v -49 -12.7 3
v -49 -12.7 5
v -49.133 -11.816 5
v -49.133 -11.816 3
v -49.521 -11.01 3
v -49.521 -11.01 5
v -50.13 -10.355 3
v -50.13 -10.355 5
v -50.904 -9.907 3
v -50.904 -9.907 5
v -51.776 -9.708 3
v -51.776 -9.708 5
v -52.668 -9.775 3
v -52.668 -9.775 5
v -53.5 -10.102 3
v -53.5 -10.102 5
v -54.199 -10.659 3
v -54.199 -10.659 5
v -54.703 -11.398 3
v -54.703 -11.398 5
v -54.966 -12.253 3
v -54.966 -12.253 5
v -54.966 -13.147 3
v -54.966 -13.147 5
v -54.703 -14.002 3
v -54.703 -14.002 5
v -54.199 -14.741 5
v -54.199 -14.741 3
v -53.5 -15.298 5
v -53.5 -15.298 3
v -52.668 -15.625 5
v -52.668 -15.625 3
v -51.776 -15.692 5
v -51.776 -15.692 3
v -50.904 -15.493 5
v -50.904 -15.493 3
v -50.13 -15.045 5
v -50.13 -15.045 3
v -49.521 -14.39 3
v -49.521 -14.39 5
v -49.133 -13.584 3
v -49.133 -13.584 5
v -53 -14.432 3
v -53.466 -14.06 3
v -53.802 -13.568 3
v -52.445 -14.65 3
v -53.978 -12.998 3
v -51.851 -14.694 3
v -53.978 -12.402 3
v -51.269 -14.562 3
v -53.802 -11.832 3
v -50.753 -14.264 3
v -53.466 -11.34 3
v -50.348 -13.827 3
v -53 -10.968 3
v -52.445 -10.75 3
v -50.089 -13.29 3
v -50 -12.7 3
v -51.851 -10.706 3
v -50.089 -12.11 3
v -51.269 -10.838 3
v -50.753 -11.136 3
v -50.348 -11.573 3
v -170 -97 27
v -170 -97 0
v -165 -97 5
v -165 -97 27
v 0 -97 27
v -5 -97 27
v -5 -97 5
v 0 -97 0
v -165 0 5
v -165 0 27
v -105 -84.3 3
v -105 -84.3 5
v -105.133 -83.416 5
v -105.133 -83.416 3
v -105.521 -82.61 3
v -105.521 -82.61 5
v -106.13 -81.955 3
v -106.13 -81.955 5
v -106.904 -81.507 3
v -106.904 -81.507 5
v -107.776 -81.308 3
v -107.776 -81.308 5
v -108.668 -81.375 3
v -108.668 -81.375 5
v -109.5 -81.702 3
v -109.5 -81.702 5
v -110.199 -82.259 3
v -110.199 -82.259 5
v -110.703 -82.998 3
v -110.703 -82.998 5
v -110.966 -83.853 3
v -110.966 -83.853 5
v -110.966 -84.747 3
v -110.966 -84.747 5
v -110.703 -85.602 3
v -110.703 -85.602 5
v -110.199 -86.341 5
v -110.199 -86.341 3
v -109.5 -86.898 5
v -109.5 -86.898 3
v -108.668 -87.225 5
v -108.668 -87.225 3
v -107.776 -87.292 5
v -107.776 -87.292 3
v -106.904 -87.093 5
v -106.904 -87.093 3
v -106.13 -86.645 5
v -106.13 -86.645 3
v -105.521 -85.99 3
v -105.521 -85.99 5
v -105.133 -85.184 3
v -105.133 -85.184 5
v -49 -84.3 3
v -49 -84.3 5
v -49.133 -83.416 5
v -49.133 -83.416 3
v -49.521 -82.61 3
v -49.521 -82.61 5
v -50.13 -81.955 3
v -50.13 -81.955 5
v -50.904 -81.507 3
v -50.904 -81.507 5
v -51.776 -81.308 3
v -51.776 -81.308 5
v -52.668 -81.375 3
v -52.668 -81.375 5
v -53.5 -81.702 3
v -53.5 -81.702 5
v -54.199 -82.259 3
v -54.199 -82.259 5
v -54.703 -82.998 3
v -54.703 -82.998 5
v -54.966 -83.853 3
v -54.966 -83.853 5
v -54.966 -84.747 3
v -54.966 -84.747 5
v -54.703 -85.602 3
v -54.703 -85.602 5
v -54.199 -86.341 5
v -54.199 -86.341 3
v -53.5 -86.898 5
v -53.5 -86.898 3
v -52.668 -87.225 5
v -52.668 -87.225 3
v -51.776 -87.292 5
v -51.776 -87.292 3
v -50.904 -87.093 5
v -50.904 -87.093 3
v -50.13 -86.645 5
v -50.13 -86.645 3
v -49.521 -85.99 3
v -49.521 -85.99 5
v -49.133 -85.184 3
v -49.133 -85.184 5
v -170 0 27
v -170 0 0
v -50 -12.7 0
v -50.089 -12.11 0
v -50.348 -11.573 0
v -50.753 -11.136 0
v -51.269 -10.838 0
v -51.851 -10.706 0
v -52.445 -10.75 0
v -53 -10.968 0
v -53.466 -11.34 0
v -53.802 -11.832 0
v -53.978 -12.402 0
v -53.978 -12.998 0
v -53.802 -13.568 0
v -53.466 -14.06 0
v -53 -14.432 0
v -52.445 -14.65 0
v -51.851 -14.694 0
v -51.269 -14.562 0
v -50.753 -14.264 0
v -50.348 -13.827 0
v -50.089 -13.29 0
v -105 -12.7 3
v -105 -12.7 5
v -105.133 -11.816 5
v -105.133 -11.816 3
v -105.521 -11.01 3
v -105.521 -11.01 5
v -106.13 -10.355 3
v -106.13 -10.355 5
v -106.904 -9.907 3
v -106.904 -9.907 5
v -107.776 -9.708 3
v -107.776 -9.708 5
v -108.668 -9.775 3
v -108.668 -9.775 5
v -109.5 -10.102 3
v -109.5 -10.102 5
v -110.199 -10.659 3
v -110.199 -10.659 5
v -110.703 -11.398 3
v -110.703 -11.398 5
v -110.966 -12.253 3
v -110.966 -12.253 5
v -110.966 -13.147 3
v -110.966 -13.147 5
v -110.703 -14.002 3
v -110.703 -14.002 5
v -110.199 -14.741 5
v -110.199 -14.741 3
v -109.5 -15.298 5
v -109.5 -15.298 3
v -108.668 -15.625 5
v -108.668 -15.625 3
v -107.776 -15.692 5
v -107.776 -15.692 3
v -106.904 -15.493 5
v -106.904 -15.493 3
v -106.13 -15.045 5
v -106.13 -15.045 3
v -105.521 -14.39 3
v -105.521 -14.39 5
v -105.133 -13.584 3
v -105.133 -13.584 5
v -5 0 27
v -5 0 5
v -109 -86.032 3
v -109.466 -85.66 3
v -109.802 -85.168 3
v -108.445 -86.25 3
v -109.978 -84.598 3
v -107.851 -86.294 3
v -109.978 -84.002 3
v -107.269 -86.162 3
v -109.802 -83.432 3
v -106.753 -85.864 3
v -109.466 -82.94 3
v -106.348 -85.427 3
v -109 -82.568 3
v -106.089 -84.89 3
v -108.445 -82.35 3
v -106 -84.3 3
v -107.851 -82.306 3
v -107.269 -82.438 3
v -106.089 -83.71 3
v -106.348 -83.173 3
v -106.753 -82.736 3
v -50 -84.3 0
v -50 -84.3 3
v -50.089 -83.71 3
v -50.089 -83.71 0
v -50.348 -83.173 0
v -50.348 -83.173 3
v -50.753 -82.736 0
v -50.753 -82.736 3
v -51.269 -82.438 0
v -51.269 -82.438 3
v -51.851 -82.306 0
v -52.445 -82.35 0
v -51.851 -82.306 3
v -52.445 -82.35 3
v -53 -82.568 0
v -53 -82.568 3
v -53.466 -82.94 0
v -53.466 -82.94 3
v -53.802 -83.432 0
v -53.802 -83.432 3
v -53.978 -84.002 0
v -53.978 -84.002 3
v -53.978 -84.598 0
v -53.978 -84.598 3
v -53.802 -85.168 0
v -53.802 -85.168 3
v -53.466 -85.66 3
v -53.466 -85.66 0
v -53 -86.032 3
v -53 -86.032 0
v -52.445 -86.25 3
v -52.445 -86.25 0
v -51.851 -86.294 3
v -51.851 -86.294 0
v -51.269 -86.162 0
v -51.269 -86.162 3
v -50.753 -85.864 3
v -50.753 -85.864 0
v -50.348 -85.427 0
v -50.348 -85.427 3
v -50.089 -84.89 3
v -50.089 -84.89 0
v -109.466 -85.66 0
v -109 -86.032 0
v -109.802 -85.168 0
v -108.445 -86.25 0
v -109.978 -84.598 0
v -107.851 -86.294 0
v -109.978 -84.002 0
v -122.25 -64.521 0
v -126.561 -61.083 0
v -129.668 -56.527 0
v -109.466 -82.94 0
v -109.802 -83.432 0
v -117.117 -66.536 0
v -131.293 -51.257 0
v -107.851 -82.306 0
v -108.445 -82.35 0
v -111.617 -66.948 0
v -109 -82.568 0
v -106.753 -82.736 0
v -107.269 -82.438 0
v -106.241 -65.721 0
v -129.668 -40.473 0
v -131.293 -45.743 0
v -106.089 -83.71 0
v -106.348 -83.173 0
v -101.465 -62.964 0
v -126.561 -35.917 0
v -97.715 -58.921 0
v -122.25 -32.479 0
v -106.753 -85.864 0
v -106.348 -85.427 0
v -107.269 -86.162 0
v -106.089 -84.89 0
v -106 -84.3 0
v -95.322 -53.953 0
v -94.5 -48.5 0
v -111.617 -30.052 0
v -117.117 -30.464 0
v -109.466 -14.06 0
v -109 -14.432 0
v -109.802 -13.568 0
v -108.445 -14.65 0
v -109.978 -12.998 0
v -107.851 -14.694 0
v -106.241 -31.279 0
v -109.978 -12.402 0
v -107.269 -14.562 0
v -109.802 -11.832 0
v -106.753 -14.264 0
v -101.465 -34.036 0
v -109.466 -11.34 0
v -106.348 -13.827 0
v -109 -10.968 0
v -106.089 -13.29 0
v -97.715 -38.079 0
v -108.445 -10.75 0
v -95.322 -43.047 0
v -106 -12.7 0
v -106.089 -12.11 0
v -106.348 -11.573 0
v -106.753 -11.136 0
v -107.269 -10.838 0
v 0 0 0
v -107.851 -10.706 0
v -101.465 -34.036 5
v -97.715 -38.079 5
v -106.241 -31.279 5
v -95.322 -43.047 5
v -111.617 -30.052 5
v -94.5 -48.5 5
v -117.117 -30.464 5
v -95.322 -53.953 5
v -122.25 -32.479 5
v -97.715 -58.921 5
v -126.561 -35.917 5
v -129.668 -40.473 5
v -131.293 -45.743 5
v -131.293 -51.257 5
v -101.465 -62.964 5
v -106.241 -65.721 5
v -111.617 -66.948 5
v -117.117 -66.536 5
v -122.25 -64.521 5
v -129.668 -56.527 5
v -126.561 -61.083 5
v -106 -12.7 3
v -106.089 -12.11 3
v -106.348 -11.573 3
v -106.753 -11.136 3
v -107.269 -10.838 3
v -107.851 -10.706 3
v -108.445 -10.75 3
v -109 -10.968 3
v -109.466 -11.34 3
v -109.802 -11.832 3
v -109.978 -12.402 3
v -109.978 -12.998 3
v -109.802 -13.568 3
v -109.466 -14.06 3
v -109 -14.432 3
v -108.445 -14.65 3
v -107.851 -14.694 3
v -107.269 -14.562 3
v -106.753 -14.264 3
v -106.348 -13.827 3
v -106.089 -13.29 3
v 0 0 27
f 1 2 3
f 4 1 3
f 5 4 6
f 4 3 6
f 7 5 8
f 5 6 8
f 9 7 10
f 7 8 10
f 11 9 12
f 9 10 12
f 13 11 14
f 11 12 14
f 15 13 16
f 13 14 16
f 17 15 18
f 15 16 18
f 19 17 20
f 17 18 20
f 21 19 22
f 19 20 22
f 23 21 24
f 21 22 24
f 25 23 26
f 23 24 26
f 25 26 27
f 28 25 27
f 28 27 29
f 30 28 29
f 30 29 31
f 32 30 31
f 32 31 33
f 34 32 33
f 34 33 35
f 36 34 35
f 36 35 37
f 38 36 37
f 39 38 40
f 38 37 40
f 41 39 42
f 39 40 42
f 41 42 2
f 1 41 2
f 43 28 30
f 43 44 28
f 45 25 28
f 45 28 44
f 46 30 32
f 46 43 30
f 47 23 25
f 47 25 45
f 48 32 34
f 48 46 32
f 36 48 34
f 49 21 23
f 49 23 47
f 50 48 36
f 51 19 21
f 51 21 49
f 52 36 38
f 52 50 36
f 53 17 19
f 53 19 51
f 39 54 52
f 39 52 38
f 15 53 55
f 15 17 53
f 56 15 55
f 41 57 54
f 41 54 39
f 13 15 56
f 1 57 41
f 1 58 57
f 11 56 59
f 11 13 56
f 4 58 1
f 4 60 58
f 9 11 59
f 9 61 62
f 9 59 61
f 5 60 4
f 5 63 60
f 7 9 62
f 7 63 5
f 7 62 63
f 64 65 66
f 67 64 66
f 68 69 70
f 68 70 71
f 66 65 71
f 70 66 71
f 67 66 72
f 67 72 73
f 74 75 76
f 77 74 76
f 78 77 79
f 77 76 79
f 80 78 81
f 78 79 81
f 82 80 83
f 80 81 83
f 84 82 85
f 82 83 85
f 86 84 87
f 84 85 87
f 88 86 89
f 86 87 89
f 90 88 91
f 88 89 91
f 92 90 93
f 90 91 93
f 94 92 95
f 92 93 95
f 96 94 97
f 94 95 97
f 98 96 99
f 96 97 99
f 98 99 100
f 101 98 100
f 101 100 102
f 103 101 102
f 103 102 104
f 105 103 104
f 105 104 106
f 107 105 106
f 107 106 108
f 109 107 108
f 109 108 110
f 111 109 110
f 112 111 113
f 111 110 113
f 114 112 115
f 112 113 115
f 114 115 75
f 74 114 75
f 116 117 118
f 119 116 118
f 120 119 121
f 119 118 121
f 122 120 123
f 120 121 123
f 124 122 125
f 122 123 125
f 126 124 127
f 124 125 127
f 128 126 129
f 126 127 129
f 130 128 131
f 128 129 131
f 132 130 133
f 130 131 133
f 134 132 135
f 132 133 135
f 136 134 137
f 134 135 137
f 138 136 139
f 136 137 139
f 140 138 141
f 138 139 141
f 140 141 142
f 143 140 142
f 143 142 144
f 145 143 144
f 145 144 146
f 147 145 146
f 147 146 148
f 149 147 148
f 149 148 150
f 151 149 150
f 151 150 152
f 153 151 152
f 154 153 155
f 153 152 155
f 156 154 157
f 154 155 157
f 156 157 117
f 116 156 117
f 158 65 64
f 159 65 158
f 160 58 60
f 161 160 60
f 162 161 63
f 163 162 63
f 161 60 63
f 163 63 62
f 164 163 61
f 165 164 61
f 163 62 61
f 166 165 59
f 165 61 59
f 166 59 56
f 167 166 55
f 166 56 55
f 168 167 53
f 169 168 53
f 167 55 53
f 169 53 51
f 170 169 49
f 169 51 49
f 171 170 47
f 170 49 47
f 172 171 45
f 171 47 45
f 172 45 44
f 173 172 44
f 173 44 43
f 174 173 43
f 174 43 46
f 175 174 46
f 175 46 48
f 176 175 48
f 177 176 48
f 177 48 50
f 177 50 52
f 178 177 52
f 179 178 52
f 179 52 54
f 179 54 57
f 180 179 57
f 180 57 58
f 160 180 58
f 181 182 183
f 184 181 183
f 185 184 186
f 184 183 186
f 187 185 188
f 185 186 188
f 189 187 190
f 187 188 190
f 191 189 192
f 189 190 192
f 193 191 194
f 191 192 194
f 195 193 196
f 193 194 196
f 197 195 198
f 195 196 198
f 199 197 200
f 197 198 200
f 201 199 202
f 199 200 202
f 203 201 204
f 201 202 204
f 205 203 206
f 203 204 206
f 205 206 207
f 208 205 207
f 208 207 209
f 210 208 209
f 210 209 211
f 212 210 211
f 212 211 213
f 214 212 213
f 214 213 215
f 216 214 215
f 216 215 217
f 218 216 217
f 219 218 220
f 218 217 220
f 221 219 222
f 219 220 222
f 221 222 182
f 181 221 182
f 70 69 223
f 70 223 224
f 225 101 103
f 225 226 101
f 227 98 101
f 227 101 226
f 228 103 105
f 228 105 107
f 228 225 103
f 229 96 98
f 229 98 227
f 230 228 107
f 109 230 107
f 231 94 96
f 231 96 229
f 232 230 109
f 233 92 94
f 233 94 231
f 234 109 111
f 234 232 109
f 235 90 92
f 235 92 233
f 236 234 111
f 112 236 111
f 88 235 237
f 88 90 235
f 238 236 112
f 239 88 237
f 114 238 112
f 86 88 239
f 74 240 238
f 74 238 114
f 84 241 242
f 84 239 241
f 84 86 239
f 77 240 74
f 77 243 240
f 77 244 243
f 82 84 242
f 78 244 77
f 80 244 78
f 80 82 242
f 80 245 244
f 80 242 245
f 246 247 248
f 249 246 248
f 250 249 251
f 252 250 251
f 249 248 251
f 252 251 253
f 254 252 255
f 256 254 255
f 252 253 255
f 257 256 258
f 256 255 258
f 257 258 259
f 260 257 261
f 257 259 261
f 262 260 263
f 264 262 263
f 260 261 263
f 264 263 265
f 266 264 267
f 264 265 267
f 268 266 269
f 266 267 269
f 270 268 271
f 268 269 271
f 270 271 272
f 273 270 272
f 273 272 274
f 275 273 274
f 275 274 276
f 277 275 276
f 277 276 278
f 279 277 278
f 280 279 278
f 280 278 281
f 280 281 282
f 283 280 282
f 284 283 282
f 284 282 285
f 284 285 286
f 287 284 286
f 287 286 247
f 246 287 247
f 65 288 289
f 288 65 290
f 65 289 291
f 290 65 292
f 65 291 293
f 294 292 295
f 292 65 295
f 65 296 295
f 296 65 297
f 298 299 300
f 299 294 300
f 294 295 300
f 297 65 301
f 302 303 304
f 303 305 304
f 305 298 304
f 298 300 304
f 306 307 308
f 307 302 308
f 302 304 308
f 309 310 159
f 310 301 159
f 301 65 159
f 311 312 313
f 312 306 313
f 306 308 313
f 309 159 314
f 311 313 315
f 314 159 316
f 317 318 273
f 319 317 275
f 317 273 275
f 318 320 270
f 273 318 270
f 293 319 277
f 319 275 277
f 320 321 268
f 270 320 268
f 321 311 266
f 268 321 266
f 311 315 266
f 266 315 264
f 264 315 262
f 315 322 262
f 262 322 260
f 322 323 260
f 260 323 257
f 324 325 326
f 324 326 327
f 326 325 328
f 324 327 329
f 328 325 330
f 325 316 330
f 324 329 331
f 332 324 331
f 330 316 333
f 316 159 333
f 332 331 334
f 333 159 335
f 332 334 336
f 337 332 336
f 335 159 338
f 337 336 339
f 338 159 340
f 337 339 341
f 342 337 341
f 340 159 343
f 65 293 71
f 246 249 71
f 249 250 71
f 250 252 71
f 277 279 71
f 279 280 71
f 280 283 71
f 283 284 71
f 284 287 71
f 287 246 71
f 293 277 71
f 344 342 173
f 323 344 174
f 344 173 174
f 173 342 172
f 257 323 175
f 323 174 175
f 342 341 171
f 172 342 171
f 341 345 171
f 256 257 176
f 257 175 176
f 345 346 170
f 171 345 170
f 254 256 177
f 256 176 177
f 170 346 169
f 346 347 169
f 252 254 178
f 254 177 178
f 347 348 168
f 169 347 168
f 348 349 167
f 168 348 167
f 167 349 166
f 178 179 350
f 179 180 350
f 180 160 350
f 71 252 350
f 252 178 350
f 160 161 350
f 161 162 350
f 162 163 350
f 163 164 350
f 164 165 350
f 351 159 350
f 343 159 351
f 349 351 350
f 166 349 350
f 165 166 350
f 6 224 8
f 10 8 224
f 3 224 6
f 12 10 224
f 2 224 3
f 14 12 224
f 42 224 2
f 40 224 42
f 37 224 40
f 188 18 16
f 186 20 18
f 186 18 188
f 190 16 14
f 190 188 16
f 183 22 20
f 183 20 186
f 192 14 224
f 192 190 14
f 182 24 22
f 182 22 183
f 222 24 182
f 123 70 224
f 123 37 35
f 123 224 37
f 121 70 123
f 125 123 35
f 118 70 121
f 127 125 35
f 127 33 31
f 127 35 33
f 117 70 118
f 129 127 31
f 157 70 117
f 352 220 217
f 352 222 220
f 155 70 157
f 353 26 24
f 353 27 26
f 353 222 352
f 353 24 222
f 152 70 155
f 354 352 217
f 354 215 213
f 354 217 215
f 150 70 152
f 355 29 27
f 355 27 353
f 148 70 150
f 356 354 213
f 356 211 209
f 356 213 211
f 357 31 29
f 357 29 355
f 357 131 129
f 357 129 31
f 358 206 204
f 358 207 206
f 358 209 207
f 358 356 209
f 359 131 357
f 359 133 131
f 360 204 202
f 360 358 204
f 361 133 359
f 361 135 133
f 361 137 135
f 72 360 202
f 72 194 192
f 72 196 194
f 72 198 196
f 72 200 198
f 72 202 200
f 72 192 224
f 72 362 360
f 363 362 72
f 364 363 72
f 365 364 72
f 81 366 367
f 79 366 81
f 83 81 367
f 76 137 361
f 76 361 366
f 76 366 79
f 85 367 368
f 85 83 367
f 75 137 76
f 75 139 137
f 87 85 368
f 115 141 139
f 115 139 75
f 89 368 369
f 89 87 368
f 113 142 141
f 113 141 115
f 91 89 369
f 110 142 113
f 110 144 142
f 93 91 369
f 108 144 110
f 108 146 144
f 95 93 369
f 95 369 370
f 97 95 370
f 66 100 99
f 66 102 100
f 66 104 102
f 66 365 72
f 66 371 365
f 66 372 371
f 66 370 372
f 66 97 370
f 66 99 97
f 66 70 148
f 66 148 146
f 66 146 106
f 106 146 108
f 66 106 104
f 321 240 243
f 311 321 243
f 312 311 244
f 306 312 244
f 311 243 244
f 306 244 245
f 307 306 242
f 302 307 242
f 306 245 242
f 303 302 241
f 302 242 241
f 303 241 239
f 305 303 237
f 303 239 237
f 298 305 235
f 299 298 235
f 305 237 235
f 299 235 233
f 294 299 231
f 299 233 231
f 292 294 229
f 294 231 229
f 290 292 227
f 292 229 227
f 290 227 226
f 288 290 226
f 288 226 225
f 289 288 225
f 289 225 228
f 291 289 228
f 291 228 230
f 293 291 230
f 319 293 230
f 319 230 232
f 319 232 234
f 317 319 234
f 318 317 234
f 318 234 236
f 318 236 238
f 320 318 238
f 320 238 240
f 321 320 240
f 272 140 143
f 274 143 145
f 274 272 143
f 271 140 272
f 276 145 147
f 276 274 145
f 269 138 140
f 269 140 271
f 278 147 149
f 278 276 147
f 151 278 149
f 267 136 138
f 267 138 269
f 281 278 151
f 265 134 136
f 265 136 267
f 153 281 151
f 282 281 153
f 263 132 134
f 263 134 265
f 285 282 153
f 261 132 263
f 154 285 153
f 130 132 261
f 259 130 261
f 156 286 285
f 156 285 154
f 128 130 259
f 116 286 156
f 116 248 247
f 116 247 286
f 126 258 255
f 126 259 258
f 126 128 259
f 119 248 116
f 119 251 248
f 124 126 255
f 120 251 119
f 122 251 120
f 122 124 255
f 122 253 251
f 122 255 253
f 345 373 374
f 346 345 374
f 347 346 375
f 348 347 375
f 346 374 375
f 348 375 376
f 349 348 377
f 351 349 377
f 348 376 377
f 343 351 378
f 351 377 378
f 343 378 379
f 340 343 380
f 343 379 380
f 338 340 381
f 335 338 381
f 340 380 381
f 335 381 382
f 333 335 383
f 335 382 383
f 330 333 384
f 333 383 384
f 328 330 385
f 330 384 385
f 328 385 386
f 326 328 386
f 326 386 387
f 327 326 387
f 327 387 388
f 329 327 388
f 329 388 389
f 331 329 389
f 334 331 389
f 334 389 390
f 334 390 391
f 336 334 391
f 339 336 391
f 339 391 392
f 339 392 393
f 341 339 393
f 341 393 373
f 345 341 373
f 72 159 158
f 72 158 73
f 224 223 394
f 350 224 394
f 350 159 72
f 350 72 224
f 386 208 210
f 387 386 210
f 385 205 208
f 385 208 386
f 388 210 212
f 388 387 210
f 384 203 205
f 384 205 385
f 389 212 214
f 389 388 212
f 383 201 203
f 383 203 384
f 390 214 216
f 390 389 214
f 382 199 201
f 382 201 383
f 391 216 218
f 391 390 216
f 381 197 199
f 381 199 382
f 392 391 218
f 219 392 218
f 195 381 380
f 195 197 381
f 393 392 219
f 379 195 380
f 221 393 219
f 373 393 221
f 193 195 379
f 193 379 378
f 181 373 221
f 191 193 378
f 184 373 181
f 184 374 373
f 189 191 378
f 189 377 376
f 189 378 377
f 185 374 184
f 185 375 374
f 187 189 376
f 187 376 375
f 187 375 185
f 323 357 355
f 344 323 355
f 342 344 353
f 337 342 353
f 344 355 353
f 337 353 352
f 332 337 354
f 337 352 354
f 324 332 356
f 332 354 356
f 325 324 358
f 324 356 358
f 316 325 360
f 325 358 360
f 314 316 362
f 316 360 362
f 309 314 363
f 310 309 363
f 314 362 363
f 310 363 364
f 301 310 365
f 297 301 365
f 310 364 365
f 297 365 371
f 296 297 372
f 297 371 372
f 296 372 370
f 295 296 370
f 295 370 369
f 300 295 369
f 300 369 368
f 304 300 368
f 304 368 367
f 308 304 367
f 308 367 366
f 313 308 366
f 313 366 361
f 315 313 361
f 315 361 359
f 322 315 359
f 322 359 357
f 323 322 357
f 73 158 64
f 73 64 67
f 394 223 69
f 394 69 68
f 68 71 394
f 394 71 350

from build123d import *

# Parameters (mm, degrees)
SKETCH_1_W               = 170
SKETCH_1_H               = 97
EXTRUDE_1_DEPTH          = 27
CUT_EXTRUDE_1_DEPTH      = 198.580363397
CUT_EXTRUDE_1_DEPTH_BACK = 198.580363397
SKETCH_4_W               = 2
SKETCH_4_H               = 2
CUT_EXTRUDE_2_DEPTH      = 198.580363397
SKETCH_5_R               = 18.5
SKETCH_5_R_2             = 2
CUT_EXTRUDE_3_DEPTH      = 197.959386677
SKETCH_6_R               = 3
CUT_EXTRUDE_4_DEPTH      = 2


with BuildPart() as part:
    # 草图1 → 凸台-拉伸1 (new body)
    with BuildSketch(Plane.XY):
        with Locations((-85, -48.5)):
            Rectangle(SKETCH_1_W, SKETCH_1_H)
    extrude(amount=EXTRUDE_1_DEPTH)

    # 草图2 → 切除-拉伸1 (cut, two sides: drawn at the far end of the back side and taken through both)
    with BuildSketch(Plane(origin=(0, 0, 0), x_dir=(1, 0, 0), z_dir=(0, 1, 0)).offset(-CUT_EXTRUDE_1_DEPTH_BACK)):
        Polygon((-5, -5), (-165, -5), (-165, -25), (-163, -25), (-163, -27), (-7, -27), (-7, -25), (-5, -25), align=None)
    extrude(amount=CUT_EXTRUDE_1_DEPTH + CUT_EXTRUDE_1_DEPTH_BACK, mode=Mode.SUBTRACT)

    # 草图4 → 切除-拉伸2 (cut, through all)
    with BuildSketch(Plane(origin=(0, 0, 0), x_dir=(1, 0, 0), z_dir=(0, 1, 0))):
        with Locations((-6, -26)):
            Rectangle(SKETCH_4_W, SKETCH_4_H)
        with Locations((-164, -26)):
            Rectangle(SKETCH_4_W, SKETCH_4_H)
    extrude(amount=-CUT_EXTRUDE_2_DEPTH, mode=Mode.SUBTRACT)

    # 草图5 → 切除-拉伸3 (cut, through all)
    with BuildSketch(Plane.XY.offset(5)):
        with Locations((-113, -48.5)):
            Circle(SKETCH_5_R)
        with Locations((-108, -12.7)):
            Circle(SKETCH_5_R_2)
        with Locations((-108, -84.3)):
            Circle(SKETCH_5_R_2)
        with Locations((-52, -12.7)):
            Circle(SKETCH_5_R_2)
        with Locations((-52, -84.3)):
            Circle(SKETCH_5_R_2)
    extrude(amount=-CUT_EXTRUDE_3_DEPTH, mode=Mode.SUBTRACT)

    # 草图6 → 切除-拉伸4 (cut)
    with BuildSketch(Plane.XY.offset(5)):
        with Locations((-108, -12.7)):
            Circle(SKETCH_6_R)
        with Locations((-52, -12.7)):
            Circle(SKETCH_6_R)
        with Locations((-108, -84.3)):
            Circle(SKETCH_6_R)
        with Locations((-52, -84.3)):
            Circle(SKETCH_6_R)
    extrude(amount=-CUT_EXTRUDE_4_DEPTH, mode=Mode.SUBTRACT)


solid = part.part
